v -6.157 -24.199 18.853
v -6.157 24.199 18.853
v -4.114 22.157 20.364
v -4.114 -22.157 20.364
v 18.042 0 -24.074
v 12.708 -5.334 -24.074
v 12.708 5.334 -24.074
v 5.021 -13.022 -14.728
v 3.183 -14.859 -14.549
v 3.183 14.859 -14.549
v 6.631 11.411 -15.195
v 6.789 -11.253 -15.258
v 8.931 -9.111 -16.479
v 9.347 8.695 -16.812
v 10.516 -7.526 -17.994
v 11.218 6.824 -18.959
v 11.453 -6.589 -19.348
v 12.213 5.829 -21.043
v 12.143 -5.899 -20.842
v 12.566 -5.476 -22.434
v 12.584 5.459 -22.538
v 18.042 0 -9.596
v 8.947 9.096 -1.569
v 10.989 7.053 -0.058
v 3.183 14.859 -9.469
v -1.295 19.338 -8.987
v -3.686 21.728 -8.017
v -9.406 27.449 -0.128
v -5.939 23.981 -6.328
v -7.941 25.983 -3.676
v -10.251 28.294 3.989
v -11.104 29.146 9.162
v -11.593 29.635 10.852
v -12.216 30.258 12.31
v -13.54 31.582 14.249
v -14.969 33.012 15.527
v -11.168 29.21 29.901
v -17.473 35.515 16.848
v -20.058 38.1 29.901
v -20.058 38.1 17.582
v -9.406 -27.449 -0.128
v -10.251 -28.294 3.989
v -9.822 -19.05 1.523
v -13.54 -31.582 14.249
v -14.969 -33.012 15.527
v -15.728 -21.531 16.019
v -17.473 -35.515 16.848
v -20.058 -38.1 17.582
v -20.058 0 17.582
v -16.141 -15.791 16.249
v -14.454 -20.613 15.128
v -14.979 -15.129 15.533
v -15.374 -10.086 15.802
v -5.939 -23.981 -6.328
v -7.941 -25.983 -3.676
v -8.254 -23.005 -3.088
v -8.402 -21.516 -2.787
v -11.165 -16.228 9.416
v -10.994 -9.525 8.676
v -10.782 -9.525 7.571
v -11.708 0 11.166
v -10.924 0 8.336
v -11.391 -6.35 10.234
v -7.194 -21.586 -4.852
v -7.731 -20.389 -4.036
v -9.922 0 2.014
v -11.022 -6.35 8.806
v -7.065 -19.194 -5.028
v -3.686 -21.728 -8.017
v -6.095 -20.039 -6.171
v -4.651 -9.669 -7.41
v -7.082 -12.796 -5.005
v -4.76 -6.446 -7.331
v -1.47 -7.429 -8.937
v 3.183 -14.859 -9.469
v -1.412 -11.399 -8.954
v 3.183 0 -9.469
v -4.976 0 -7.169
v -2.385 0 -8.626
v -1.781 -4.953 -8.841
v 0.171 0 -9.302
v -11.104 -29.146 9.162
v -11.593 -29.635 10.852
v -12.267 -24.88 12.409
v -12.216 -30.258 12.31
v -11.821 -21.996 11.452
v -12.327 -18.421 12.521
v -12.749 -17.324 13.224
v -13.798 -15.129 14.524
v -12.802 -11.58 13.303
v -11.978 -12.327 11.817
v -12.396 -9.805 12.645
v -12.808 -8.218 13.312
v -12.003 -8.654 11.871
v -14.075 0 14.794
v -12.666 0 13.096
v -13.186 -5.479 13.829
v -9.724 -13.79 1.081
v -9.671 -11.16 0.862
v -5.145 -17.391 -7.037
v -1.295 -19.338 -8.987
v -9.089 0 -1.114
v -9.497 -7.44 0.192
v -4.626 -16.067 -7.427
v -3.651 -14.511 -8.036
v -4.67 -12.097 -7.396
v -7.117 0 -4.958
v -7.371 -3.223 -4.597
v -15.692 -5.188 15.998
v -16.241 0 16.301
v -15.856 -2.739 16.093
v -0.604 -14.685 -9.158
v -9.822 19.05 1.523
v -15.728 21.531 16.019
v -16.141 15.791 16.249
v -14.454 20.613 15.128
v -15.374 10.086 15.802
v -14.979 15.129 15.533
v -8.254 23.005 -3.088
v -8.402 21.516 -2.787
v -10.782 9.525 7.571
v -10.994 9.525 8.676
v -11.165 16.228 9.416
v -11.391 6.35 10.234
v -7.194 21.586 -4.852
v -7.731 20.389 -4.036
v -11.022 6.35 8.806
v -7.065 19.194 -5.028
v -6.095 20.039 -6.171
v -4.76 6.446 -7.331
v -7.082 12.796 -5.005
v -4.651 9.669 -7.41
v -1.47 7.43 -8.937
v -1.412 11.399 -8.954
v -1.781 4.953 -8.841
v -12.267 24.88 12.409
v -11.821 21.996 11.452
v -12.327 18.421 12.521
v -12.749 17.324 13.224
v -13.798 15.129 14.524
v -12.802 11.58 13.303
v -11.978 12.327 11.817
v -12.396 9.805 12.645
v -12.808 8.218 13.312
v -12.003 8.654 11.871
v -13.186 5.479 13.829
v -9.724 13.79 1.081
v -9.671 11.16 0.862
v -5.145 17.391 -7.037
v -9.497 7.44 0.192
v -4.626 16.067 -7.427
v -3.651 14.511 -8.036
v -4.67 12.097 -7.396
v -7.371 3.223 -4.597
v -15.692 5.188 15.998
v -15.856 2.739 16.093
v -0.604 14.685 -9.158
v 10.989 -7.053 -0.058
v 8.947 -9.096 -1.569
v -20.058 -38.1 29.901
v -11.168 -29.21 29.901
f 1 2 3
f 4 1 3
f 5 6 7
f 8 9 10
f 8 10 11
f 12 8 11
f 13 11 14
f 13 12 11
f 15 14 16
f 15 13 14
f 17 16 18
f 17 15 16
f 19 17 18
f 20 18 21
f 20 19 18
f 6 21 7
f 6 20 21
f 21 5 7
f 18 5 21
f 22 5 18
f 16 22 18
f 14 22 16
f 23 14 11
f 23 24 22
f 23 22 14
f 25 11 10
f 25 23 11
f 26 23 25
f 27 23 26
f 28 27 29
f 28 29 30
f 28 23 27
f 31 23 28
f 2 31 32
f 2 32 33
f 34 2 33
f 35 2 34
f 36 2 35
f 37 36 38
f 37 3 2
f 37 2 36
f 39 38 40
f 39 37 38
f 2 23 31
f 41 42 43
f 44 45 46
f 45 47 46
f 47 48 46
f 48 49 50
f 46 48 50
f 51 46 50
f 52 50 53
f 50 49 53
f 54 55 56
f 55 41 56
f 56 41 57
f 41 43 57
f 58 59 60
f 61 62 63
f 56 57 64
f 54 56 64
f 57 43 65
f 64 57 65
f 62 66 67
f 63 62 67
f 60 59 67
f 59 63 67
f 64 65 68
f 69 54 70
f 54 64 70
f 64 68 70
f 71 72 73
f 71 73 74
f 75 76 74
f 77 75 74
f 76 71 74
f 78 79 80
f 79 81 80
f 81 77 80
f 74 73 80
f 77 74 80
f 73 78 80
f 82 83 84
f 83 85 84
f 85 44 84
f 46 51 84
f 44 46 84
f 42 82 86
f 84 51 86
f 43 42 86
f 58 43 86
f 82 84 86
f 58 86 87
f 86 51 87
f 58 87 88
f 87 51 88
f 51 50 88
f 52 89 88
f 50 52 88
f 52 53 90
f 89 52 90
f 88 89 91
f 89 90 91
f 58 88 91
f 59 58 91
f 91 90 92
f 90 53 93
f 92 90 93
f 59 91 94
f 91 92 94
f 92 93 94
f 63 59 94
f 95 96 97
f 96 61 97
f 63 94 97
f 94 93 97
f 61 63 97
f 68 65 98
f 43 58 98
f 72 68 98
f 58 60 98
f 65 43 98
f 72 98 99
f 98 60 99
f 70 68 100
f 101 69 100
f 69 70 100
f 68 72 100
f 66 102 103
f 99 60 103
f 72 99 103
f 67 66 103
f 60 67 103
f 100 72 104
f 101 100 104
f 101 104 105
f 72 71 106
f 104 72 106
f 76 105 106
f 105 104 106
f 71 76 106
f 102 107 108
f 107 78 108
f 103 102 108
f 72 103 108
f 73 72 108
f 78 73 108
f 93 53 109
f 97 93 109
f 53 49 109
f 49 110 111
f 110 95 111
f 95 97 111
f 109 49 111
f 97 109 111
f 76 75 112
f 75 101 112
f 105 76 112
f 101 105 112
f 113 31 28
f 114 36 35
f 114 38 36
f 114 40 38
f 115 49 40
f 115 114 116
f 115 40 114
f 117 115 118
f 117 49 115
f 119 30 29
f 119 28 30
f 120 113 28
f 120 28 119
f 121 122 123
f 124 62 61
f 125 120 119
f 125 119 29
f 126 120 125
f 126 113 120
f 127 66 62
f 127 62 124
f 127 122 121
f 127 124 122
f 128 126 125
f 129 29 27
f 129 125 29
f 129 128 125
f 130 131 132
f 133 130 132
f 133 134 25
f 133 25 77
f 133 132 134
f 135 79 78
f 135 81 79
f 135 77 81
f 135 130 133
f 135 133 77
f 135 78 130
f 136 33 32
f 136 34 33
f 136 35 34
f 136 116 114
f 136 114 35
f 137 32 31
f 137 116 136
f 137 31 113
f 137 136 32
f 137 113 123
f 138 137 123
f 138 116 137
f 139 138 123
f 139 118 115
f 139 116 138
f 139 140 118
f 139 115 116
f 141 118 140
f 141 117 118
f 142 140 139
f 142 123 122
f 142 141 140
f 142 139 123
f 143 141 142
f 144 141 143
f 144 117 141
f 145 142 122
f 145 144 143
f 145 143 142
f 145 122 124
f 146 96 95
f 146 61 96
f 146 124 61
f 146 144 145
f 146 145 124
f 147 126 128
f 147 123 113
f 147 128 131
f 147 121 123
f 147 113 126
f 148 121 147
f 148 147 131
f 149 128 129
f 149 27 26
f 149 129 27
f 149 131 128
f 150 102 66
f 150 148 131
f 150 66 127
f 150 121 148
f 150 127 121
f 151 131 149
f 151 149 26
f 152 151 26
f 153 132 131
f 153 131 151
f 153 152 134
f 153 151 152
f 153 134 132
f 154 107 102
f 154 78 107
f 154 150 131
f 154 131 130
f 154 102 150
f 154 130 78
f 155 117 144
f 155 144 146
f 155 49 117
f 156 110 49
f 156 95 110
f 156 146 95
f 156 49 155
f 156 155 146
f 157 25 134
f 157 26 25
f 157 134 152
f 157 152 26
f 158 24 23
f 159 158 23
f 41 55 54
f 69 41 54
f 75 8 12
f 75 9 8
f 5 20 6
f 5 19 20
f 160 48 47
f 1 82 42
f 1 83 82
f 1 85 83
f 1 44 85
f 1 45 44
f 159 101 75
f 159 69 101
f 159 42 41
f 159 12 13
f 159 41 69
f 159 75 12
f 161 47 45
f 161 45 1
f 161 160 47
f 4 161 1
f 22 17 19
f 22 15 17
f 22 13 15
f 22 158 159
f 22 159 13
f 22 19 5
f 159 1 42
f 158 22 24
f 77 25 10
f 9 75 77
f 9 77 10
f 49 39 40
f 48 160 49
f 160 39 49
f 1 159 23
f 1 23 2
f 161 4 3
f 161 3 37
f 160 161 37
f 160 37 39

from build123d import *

# Parameters (mm, degrees)
F1_DEPTH = 76.2
F3_DEPTH = 63.5


with BuildPart() as f1:
    # F0 (on Front) → F1 (new body, symmetric)
    with BuildSketch(Plane.XZ):
        with BuildLine():
            ThreePointArc((3.1831930964, -14.5487436358), (9.9183851872, -17.338551545), (12.7081930964, -24.0737436358))
            Line((12.7081930964, -24.0737436358), (18.0421930964, -24.0737436358))
            Line((18.0421930964, -24.0737436358), (18.0421930964, -9.5957436358))
            Line((18.0421930964, -9.5957436358), (10.9887288065, -0.0582332264))
            Line((10.9887288065, -0.0582332264), (8.9465308884, -1.5685403684))
            Line((8.9465308884, -1.5685403684), (-6.1565405318, 18.8534388128))
            Line((-6.1565405318, 18.8534388128), (-4.1143426137, 20.3637459548))
            Line((-4.1143426137, 20.3637459548), (-11.1678069036, 29.9012563642))
            Line((-11.1678069036, 29.9012563642), (-20.0578069036, 29.9012563642))
            Line((-20.0578069036, 29.9012563642), (-20.0578069036, 17.5822563642))
            add(Edge.make_bspline(
                [(-20.0578069036, 17.5822563642), (-10.1148920839, 15.5647495743), (-12.2363609879, 0.8391823706), (-4.9954212044, -9.7400596384), (3.1831930964, -9.4687436358)],
                knots=[0, 0, 0, 0, 0.513981523, 1, 1, 1, 1], degree=3))
            Line((3.1831930964, -9.4687436358), (3.1831930964, -14.5487436358))
        make_face()
    extrude(amount=F1_DEPTH, both=True)

    # F2 (on Top) → F3 (intersect, symmetric)
    with BuildSketch(Plane.XY):
        Polygon((18.0421930964, 0), (-20.0578069036, 38.1), (-20.0578069036, -38.1), align=None)
    extrude(amount=F3_DEPTH, both=True, mode=Mode.INTERSECT)


solid = f1.part
